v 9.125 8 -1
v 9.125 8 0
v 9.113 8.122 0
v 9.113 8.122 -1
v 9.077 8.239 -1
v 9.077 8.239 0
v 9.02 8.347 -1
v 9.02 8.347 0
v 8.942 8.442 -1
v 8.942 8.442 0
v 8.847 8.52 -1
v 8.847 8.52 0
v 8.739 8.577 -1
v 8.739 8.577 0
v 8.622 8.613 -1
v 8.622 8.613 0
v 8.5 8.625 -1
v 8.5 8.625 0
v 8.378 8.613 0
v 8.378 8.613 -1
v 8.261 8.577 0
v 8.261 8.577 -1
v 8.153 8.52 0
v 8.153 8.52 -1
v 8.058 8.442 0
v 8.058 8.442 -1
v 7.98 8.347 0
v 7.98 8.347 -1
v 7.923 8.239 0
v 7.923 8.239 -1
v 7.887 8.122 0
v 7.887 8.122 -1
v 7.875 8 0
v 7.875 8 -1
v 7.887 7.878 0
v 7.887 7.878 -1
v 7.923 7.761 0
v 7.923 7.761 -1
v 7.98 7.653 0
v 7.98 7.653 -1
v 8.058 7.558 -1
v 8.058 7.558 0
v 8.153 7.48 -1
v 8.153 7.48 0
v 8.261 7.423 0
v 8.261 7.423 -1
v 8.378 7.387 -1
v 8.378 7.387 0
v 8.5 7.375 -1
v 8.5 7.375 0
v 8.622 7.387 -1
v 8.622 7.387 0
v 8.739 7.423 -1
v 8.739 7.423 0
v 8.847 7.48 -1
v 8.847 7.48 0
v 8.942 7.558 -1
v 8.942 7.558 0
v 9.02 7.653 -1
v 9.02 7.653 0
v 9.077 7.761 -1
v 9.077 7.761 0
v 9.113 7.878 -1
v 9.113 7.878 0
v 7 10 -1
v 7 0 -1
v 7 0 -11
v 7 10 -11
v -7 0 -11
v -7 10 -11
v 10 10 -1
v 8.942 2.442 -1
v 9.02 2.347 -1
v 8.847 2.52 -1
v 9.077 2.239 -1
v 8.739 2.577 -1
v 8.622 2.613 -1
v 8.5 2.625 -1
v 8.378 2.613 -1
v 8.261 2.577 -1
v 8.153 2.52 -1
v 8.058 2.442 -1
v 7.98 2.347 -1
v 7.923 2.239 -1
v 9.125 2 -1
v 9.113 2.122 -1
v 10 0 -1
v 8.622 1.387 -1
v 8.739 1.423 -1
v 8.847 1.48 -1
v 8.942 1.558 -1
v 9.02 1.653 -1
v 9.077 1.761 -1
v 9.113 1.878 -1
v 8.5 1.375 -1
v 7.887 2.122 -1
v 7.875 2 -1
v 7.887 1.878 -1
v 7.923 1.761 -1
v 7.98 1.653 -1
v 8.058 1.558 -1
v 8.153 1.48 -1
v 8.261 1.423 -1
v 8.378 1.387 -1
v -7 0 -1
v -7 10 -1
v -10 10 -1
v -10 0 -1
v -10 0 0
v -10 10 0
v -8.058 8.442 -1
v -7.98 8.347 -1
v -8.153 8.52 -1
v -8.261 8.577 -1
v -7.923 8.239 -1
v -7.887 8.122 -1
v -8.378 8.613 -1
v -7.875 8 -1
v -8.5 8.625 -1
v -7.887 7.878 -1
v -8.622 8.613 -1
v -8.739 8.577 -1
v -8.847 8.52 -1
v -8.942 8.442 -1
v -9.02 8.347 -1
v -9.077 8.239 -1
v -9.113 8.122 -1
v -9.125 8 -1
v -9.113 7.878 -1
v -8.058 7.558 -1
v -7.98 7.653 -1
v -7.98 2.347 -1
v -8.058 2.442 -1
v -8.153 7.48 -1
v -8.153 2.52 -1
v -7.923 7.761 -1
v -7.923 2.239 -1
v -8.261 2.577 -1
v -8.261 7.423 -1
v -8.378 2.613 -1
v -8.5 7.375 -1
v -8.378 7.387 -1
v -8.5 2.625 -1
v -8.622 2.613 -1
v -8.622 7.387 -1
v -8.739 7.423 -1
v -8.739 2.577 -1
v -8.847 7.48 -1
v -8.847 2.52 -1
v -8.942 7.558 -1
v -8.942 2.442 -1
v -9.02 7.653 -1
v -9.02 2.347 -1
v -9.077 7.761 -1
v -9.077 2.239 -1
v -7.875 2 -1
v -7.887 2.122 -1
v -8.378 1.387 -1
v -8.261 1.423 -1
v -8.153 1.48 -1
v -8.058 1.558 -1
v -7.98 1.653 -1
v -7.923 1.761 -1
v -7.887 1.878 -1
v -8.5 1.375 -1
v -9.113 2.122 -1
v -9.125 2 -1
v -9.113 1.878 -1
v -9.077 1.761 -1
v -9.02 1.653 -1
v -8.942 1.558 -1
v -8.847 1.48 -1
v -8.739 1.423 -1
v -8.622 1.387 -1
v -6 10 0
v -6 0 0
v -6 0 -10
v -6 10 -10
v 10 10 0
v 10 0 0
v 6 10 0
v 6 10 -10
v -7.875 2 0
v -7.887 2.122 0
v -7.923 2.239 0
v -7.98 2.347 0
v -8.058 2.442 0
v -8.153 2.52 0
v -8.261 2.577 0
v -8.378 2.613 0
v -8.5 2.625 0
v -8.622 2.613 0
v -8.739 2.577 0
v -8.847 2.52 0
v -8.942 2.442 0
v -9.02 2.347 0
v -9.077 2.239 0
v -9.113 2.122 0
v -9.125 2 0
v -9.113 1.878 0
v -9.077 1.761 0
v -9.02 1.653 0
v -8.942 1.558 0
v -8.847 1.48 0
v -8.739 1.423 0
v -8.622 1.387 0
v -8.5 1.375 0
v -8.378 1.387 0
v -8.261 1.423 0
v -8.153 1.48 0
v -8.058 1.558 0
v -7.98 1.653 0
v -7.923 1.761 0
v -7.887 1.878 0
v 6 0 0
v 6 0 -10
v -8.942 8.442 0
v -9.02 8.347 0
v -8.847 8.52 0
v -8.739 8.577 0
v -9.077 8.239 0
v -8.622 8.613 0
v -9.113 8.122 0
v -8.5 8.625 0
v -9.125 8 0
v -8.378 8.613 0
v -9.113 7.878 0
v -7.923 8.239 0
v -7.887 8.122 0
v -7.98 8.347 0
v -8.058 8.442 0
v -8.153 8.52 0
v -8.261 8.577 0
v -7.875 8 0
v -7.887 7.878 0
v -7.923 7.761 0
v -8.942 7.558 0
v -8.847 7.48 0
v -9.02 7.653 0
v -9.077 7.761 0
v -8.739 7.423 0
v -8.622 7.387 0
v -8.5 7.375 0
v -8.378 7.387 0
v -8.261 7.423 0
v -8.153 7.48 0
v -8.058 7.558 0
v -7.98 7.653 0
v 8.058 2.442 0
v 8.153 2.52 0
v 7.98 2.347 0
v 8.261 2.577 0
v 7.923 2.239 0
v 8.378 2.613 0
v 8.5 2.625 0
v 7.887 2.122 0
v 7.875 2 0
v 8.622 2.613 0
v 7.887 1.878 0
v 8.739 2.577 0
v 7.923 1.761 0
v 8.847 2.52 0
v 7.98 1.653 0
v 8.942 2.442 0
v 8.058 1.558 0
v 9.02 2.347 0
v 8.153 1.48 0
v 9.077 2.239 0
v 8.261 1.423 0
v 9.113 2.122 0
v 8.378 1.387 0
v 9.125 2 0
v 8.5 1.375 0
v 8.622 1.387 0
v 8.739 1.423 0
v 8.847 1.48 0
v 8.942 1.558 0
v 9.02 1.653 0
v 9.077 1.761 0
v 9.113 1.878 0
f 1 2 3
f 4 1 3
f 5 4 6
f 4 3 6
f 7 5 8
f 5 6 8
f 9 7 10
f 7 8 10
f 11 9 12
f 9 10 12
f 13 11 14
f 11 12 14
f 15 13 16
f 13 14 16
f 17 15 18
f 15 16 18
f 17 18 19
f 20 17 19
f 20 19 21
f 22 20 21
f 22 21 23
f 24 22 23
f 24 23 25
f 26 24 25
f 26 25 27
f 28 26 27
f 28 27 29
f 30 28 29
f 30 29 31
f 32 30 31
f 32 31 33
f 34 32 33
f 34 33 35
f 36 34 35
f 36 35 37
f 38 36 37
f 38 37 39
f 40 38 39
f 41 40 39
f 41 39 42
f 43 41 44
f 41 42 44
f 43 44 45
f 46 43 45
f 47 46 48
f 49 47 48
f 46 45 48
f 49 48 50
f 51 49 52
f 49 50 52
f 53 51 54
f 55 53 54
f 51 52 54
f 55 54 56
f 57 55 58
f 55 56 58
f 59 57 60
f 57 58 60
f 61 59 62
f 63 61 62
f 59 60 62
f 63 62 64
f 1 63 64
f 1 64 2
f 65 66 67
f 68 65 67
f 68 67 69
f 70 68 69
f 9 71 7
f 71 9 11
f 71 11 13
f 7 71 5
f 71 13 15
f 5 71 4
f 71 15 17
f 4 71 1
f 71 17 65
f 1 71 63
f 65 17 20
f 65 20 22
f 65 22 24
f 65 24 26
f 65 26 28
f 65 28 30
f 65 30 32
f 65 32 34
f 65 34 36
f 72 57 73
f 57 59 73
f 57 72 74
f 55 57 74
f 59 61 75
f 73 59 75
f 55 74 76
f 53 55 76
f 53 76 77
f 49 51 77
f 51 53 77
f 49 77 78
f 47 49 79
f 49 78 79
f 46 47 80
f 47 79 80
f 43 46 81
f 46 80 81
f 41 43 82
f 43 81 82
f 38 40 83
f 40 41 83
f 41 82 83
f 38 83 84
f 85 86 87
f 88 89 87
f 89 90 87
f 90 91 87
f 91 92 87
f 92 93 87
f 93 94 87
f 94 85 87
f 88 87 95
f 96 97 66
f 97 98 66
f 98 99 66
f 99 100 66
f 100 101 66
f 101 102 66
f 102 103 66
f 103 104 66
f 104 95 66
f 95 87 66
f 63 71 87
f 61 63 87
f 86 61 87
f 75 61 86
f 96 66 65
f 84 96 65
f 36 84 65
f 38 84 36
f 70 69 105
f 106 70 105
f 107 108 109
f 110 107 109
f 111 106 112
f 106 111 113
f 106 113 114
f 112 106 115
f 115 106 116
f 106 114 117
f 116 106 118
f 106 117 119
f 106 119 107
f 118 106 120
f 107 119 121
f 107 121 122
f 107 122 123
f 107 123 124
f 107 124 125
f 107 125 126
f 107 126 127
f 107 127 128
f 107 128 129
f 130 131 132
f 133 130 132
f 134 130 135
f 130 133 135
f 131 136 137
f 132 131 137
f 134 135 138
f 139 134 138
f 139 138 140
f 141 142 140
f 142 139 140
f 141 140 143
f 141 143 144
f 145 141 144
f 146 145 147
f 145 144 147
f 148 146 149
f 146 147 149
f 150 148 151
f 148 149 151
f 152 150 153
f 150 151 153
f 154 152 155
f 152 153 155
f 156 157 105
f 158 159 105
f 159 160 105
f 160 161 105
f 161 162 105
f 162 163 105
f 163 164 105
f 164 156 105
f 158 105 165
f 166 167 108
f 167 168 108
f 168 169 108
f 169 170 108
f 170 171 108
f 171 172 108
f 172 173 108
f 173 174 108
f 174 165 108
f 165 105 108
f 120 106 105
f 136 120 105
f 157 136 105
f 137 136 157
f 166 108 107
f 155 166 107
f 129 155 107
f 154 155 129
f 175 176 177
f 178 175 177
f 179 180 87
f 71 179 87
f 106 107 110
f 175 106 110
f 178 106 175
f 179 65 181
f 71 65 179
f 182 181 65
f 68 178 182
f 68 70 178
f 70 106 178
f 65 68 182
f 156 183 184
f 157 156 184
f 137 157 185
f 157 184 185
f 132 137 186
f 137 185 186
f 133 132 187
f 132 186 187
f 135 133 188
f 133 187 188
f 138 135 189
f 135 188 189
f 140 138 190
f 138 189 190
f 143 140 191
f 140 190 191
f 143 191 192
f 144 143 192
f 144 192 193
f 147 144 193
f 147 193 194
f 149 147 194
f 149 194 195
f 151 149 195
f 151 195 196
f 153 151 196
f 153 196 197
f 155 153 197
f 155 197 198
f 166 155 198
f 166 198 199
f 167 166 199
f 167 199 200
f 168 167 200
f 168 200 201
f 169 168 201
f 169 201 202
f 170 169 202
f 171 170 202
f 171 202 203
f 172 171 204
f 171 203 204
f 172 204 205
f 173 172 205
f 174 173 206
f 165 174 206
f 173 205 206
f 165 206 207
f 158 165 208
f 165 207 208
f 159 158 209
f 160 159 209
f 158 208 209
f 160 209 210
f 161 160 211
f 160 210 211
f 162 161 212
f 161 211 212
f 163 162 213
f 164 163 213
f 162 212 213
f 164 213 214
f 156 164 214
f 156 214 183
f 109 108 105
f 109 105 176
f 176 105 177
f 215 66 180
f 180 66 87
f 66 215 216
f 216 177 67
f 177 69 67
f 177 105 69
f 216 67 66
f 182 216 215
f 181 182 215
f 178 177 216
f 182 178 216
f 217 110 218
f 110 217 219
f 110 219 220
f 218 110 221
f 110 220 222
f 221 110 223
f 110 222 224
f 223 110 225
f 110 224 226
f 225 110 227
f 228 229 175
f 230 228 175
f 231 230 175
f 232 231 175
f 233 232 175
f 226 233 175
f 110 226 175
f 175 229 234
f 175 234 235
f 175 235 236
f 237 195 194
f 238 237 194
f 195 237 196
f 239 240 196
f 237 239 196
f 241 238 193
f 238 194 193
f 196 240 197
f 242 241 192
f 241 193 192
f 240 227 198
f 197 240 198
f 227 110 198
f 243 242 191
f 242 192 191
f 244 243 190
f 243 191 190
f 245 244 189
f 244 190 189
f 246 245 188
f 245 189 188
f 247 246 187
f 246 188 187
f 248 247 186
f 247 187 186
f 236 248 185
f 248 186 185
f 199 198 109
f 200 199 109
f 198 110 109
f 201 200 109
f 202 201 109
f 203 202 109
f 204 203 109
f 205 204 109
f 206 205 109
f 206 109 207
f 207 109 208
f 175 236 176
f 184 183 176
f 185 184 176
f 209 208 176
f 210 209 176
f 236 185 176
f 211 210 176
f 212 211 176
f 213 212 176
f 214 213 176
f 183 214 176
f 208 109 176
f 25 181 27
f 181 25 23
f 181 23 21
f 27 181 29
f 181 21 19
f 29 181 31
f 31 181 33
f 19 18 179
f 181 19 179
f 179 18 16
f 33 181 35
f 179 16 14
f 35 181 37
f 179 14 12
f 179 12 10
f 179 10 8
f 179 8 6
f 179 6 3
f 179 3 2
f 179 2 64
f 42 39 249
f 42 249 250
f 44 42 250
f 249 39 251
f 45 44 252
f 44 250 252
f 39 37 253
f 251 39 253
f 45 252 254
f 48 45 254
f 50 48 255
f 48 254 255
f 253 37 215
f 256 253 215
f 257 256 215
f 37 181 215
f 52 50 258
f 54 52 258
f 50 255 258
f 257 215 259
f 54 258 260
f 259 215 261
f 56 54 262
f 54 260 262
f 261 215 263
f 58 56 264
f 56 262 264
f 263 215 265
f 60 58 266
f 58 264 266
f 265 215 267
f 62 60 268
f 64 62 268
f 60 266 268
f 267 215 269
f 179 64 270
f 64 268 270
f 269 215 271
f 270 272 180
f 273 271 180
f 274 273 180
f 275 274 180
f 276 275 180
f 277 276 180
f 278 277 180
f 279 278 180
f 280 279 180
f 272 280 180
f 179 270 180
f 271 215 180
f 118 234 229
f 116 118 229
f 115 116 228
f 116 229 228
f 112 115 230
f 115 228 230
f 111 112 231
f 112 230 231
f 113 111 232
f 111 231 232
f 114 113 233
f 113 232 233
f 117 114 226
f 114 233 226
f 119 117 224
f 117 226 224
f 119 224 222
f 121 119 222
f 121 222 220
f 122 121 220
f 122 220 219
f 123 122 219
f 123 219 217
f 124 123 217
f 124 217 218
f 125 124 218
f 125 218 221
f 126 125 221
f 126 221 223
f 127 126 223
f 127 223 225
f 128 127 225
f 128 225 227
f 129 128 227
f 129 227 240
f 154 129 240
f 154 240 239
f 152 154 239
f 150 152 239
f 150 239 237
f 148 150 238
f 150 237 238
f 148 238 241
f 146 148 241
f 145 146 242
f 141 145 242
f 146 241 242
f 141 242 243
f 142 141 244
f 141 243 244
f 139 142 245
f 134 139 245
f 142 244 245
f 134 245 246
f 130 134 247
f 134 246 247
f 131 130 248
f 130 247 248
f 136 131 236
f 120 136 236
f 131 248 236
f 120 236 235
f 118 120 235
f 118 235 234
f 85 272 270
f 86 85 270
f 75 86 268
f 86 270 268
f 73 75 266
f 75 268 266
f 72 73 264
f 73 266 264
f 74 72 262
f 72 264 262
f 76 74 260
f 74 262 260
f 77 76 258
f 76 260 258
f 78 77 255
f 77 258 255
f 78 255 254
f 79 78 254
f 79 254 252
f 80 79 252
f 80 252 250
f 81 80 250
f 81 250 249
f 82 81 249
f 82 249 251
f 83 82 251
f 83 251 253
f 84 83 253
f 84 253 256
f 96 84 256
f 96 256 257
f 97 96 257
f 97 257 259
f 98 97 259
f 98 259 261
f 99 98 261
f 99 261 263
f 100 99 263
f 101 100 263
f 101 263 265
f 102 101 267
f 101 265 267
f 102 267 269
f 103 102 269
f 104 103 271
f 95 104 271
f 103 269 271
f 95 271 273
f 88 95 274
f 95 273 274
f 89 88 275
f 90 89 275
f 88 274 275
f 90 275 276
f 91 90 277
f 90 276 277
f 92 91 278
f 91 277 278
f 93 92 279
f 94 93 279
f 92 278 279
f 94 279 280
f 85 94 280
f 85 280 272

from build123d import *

# Parameters (mm, degrees)
EXTRUDE_1_DEPTH          = 10
HOLE_WIZARD_M1_6_1_D     = 1.25
HOLE_WIZARD_M1_6_1_DEPTH = 4.95
HOLE_WIZARD_M1_6_1_TIP   = 0.375537887


with BuildPart() as part:
    # 草图2 → 凸台-拉伸1 (new body)
    with BuildSketch(Plane(origin=(0, 0, 0), x_dir=(1, 0, 0), z_dir=(0, 1, 0))):
        Polygon((7, 11), (-7, 11), (-7, 1), (-10, 1), (-10, 0), (-6, 0), (-6, 10), (6, 10), (6, 0), (10, 0), (10, 1), (7, 1), align=None)
    extrude(amount=EXTRUDE_1_DEPTH)

    # M1.6 螺纹孔1
    with Locations(Plane(origin=(0, 0, -1), x_dir=(-1, 0, 0), z_dir=(0, 0, -1))):
        with Locations((-8.5, 8), (8.5, 8), (8.5, 2), (-8.5, 2)):
            Hole(HOLE_WIZARD_M1_6_1_D / 2, depth=HOLE_WIZARD_M1_6_1_DEPTH)
            with Locations((0, 0, -(HOLE_WIZARD_M1_6_1_DEPTH + HOLE_WIZARD_M1_6_1_TIP / 2))):  # 118° drill point
                Cone(0, HOLE_WIZARD_M1_6_1_D / 2, HOLE_WIZARD_M1_6_1_TIP, mode=Mode.SUBTRACT)


solid = part.part
